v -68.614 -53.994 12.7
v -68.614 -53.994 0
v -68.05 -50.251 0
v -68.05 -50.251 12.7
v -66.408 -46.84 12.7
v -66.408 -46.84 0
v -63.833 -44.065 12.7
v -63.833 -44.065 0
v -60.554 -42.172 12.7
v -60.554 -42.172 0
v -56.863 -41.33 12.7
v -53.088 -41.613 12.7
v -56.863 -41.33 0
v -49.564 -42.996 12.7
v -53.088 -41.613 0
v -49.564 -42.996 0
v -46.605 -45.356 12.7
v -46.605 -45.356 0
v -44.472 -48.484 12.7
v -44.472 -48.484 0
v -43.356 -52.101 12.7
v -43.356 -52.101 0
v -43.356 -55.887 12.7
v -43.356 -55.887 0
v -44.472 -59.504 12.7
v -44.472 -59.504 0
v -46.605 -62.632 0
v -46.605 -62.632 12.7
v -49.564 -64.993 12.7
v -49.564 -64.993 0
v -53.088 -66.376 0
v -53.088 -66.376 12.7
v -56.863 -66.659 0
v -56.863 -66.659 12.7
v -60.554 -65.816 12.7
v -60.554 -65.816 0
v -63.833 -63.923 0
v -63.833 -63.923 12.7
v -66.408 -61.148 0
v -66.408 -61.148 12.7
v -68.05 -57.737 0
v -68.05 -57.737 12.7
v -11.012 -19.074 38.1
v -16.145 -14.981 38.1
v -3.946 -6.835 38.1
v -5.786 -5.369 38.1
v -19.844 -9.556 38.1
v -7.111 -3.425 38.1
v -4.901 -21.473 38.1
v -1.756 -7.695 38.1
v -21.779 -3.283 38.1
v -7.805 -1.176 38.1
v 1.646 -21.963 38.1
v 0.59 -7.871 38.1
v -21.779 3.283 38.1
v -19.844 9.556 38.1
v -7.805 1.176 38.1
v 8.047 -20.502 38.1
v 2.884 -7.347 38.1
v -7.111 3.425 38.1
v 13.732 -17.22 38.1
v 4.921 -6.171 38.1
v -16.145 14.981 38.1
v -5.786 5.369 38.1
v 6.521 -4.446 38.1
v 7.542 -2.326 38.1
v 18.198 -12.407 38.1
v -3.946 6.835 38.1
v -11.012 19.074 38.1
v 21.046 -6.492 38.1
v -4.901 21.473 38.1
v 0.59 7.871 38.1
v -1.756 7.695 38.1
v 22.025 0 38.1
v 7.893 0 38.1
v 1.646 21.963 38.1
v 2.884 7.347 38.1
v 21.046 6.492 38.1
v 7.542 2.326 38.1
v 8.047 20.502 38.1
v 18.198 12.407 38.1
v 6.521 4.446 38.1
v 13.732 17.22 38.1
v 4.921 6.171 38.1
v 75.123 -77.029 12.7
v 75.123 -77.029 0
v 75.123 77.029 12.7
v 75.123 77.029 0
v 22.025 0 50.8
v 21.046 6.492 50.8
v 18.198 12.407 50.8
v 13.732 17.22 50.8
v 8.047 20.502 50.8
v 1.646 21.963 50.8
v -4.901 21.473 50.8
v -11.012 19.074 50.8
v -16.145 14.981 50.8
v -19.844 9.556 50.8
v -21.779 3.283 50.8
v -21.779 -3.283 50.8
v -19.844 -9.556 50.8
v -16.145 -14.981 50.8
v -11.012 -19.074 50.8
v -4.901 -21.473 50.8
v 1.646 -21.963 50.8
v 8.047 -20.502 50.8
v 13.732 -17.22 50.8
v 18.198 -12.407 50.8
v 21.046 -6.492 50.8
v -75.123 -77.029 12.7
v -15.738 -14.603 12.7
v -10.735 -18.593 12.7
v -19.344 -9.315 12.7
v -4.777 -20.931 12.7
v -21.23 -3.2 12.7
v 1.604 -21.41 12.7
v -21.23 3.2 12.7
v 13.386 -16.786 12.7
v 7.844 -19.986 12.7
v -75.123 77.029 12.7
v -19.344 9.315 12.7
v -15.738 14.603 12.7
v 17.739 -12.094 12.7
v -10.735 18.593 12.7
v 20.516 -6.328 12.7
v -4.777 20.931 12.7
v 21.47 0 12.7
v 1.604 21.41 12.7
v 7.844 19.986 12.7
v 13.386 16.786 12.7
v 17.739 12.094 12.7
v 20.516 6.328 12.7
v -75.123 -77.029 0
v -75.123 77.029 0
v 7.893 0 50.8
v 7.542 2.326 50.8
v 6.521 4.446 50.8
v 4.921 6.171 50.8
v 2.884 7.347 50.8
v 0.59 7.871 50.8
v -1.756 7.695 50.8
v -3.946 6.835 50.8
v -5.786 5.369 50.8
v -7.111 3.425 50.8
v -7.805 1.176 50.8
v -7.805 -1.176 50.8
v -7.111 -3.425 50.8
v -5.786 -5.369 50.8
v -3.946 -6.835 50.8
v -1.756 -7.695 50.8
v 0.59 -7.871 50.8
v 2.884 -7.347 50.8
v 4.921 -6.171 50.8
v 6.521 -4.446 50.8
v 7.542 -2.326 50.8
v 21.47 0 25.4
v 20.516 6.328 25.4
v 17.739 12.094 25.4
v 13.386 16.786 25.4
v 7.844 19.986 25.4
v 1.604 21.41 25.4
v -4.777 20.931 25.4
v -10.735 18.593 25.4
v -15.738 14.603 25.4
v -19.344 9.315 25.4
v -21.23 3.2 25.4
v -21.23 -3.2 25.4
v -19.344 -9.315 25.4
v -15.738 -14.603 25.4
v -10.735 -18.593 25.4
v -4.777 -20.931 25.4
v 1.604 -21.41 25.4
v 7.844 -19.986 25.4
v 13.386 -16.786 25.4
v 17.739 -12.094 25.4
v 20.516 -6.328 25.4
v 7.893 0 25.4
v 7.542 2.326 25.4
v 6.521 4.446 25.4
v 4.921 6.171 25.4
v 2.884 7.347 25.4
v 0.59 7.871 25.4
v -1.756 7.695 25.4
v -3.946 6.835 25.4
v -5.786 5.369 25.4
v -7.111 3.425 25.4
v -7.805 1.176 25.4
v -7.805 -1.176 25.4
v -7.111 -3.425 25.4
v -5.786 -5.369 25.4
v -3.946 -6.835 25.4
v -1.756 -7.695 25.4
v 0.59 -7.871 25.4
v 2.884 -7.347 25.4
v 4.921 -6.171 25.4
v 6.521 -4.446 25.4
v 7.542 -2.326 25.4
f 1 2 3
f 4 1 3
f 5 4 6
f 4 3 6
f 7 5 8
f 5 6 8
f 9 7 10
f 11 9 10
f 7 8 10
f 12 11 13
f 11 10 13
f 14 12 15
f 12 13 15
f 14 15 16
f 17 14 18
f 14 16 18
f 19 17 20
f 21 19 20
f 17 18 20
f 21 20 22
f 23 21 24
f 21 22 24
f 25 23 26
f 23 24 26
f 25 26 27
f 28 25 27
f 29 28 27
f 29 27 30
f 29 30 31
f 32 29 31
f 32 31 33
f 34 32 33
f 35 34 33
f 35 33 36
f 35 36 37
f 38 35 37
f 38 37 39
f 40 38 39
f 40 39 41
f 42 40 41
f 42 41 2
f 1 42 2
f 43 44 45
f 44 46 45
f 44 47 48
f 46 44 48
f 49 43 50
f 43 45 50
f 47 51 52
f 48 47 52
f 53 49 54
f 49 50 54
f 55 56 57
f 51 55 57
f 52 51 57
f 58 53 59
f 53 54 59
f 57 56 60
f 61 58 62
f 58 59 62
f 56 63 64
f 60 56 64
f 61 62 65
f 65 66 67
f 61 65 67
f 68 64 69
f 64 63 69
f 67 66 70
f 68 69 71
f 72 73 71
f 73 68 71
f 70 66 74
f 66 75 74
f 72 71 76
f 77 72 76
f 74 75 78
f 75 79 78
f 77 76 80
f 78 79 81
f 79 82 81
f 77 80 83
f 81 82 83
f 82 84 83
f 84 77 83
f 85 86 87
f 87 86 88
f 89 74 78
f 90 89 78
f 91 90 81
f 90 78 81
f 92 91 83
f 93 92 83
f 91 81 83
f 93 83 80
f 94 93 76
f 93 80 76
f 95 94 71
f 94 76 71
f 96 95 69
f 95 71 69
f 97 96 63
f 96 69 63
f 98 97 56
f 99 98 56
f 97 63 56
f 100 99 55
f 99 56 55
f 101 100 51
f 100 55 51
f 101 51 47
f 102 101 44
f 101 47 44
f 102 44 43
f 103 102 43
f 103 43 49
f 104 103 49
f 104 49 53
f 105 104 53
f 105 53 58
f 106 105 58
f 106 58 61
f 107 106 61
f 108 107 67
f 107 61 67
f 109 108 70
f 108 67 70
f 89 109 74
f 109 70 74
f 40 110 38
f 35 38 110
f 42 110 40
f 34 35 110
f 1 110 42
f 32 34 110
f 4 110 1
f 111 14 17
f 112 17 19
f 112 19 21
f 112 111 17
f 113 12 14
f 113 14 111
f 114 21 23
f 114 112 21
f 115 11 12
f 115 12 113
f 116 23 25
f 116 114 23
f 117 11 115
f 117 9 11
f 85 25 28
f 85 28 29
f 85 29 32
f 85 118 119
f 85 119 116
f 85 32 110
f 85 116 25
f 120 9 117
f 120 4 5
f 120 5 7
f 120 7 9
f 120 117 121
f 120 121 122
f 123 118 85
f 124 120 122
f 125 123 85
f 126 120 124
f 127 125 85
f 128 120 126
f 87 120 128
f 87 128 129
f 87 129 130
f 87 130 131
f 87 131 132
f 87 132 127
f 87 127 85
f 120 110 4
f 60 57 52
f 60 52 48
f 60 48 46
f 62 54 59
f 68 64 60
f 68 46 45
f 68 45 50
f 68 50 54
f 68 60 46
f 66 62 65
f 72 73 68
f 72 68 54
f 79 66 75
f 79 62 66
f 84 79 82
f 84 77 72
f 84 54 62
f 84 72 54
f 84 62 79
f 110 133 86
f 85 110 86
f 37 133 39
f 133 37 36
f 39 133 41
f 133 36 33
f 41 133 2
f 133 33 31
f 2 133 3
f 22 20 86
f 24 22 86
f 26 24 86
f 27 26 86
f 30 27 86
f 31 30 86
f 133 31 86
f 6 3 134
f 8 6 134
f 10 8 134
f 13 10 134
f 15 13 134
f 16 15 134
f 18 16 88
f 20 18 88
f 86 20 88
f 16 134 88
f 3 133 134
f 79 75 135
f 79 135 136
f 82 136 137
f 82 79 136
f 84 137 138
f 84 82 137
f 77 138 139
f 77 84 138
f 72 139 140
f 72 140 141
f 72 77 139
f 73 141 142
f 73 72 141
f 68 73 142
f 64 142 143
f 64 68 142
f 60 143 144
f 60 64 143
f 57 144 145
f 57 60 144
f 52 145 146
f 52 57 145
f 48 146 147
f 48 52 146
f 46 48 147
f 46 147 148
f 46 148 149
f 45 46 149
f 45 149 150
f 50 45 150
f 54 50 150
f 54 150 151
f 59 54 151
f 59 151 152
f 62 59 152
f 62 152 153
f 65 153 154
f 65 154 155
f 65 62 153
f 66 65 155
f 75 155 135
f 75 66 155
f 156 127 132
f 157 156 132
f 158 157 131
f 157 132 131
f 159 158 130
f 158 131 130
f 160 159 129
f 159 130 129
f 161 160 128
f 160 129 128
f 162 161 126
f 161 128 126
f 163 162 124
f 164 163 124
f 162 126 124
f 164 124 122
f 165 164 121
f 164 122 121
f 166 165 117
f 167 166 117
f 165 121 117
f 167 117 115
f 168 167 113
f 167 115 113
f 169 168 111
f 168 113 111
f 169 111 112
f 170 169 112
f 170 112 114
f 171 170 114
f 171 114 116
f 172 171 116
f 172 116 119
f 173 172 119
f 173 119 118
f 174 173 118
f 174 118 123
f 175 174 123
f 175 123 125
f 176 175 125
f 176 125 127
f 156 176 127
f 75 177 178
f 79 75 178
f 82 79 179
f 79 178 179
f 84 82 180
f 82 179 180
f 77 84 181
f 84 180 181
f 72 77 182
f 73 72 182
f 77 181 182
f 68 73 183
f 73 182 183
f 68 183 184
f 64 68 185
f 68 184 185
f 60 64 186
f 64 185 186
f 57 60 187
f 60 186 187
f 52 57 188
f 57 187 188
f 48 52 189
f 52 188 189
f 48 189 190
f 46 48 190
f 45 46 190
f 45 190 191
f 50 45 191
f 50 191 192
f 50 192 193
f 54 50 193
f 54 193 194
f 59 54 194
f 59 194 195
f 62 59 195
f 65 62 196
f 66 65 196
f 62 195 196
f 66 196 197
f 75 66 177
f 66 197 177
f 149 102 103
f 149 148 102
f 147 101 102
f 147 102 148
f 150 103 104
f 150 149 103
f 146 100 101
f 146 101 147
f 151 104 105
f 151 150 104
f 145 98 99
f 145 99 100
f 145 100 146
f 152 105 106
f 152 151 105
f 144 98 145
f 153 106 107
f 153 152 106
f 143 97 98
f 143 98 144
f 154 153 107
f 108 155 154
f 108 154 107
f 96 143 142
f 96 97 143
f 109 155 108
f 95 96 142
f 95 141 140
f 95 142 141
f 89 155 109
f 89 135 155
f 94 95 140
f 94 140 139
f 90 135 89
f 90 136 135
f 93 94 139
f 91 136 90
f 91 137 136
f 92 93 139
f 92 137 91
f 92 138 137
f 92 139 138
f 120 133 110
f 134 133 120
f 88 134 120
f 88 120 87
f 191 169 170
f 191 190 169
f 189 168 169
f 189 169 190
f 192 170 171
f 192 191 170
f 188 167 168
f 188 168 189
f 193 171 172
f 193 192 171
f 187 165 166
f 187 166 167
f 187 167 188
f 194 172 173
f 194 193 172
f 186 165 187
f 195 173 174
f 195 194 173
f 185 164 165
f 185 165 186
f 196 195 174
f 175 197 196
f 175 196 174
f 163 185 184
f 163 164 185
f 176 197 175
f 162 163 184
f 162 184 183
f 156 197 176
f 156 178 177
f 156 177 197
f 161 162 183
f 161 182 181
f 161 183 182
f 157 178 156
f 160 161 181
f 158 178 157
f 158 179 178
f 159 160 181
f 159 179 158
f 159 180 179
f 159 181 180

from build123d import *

# Parameters (mm, degrees)
F0_R     = 21.469749
F1_DEPTH = 25.4
F2_W     = 150.245562
F2_H     = 154.058844
F3_DEPTH = 12.7
F4_R     = 7.892908
F5_DEPTH = 12.7
F6_R     = 22.024997
F6_R_2   = 7.892908
F7_DEPTH = 12.7
F9_D     = 25.4
F9_DEPTH = 25.4


with BuildPart() as f1:
    # F0 (on Top) → F1 (new body)
    with BuildSketch(Plane.XY):
        Circle(F0_R)
    extrude(amount=F1_DEPTH)

    # F2 (on Top) → F3 (join)
    with BuildSketch(Plane.XY):
        Rectangle(F2_W, F2_H)
    extrude(amount=F3_DEPTH)

    # F4 (on face) → F5 (join)
    with BuildSketch(Plane.XY.offset(25.4)):
        Circle(F4_R)
    extrude(amount=F5_DEPTH)

    # F9
    with Locations(Plane.XY.offset(12.7)):
        with Locations((-55.914374, -53.994101)):
            Hole(F9_D / 2, depth=F9_DEPTH)


with BuildPart() as f7:
    # F6 (on face) → F7 (new body)
    with BuildSketch(Plane.XY.offset(38.1)):
        Circle(F6_R)
        Circle(F6_R_2, mode=Mode.SUBTRACT)
    extrude(amount=F7_DEPTH)


solid = Compound([f1.part, f7.part])
